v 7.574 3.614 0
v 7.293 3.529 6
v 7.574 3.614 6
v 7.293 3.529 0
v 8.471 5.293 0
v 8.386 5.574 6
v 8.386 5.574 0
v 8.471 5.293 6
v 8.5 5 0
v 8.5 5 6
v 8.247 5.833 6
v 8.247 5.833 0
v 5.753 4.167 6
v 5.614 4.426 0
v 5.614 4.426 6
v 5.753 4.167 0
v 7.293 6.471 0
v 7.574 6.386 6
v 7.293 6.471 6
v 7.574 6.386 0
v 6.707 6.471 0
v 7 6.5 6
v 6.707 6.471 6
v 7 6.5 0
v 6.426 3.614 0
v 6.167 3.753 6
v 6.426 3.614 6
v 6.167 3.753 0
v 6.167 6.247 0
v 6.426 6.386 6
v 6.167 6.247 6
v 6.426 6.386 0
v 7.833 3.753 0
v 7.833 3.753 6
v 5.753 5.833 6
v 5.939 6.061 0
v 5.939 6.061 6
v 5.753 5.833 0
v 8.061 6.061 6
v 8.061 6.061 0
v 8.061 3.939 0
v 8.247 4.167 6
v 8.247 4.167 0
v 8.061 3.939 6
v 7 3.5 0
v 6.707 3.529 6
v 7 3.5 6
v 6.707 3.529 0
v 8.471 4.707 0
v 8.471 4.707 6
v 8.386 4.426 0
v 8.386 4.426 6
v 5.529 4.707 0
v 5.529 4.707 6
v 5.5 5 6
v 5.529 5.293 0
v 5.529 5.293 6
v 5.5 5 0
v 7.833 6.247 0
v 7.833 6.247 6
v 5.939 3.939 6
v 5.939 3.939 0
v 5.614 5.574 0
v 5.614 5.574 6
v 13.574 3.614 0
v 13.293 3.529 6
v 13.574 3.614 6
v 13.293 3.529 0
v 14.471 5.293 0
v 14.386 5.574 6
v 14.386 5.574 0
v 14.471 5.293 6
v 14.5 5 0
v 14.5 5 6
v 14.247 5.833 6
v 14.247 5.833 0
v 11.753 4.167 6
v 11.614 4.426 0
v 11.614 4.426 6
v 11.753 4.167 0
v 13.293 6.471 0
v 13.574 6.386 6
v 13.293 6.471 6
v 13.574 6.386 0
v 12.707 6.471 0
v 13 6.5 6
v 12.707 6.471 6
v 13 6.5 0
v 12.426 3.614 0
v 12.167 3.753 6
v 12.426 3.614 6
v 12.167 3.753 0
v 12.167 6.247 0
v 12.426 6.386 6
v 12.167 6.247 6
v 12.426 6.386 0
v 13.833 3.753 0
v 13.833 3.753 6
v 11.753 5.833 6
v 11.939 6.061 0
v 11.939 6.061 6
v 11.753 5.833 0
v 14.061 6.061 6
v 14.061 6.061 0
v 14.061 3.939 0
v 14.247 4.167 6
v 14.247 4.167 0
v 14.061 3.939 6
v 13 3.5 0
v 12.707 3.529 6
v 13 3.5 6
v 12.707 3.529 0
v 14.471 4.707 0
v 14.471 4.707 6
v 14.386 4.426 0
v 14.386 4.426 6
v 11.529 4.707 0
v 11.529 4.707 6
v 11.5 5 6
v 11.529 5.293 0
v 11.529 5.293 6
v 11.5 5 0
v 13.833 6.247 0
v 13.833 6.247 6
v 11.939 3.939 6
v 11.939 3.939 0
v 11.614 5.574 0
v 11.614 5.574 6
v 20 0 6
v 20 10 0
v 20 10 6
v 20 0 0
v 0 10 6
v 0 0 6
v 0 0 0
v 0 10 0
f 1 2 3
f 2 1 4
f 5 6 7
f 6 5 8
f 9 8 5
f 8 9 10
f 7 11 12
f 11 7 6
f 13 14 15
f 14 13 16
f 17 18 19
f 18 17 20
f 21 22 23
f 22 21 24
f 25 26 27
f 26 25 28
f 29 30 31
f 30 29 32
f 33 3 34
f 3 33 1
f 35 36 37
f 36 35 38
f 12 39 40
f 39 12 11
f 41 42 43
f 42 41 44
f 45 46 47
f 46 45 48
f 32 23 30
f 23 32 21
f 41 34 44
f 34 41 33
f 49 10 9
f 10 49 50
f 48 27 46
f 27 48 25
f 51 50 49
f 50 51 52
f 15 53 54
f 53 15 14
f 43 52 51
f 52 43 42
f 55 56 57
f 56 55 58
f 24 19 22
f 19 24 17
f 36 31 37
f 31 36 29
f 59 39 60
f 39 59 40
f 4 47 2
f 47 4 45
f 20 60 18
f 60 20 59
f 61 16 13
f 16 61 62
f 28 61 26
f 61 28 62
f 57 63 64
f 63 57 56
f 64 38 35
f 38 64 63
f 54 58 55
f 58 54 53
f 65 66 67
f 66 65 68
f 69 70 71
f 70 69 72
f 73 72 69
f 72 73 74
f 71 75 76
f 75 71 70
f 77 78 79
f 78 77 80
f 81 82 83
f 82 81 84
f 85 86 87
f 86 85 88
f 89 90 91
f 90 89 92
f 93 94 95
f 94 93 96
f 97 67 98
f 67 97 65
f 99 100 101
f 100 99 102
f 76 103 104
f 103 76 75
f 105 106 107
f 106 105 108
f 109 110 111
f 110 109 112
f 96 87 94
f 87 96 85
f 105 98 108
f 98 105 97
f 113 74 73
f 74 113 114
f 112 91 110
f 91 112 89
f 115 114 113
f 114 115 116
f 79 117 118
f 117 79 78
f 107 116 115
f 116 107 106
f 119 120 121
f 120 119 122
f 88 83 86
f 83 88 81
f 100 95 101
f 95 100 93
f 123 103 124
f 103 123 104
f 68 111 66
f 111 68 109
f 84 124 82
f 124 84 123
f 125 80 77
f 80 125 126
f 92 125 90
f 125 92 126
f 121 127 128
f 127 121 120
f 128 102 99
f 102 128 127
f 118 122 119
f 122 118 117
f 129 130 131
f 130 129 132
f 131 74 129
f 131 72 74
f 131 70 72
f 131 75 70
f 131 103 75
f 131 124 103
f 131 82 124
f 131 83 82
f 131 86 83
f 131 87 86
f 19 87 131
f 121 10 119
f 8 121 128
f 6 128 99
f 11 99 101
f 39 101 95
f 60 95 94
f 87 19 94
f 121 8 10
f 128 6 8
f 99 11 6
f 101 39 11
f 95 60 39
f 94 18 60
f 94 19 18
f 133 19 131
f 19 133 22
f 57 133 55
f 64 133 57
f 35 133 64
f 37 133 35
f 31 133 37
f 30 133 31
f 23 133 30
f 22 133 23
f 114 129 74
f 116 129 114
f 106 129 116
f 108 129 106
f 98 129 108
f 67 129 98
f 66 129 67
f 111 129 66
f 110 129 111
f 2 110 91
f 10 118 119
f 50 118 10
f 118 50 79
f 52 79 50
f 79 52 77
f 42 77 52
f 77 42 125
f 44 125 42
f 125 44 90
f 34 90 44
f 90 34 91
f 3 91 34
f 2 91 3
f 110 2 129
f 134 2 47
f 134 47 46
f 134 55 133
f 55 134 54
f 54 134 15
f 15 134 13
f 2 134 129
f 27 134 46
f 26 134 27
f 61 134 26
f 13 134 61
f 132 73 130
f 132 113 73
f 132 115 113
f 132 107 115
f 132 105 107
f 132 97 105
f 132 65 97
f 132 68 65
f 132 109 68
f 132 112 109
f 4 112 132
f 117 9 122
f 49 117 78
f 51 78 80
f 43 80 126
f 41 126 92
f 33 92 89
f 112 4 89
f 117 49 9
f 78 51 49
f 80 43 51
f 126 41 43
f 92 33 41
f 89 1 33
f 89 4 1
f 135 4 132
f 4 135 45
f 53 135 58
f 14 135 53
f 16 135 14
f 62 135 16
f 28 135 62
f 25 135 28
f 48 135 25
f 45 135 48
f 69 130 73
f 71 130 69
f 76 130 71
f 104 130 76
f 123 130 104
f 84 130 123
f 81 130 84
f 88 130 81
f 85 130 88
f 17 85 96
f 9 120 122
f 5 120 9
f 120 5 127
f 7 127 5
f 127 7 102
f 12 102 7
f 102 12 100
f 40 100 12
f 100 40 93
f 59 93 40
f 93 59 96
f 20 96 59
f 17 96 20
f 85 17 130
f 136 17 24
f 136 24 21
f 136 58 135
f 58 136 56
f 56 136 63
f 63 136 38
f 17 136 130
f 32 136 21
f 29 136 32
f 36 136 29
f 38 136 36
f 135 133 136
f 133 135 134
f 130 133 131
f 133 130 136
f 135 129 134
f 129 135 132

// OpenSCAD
$fn = 32;

// ----------------------------------------------------------------------
// Micro pad: two-hole pad, 5-20 mm class
// ----------------------------------------------------------------------

// --- parameters (mm) ---
pad_l = 20;               // pad length, X
pad_w = 10;               // pad width, Y
pad_t = 6;                // pad thickness, Z
hole_d = 3;               // hole diameter
hole_x = 7;               // X of the first hole centre

difference() {
  cube([pad_l, pad_w, pad_t]);
  for (x = [hole_x, pad_l - hole_x])
    translate([x, pad_w / 2, -1])
      cylinder(h = pad_t + 2, d = hole_d);
}
